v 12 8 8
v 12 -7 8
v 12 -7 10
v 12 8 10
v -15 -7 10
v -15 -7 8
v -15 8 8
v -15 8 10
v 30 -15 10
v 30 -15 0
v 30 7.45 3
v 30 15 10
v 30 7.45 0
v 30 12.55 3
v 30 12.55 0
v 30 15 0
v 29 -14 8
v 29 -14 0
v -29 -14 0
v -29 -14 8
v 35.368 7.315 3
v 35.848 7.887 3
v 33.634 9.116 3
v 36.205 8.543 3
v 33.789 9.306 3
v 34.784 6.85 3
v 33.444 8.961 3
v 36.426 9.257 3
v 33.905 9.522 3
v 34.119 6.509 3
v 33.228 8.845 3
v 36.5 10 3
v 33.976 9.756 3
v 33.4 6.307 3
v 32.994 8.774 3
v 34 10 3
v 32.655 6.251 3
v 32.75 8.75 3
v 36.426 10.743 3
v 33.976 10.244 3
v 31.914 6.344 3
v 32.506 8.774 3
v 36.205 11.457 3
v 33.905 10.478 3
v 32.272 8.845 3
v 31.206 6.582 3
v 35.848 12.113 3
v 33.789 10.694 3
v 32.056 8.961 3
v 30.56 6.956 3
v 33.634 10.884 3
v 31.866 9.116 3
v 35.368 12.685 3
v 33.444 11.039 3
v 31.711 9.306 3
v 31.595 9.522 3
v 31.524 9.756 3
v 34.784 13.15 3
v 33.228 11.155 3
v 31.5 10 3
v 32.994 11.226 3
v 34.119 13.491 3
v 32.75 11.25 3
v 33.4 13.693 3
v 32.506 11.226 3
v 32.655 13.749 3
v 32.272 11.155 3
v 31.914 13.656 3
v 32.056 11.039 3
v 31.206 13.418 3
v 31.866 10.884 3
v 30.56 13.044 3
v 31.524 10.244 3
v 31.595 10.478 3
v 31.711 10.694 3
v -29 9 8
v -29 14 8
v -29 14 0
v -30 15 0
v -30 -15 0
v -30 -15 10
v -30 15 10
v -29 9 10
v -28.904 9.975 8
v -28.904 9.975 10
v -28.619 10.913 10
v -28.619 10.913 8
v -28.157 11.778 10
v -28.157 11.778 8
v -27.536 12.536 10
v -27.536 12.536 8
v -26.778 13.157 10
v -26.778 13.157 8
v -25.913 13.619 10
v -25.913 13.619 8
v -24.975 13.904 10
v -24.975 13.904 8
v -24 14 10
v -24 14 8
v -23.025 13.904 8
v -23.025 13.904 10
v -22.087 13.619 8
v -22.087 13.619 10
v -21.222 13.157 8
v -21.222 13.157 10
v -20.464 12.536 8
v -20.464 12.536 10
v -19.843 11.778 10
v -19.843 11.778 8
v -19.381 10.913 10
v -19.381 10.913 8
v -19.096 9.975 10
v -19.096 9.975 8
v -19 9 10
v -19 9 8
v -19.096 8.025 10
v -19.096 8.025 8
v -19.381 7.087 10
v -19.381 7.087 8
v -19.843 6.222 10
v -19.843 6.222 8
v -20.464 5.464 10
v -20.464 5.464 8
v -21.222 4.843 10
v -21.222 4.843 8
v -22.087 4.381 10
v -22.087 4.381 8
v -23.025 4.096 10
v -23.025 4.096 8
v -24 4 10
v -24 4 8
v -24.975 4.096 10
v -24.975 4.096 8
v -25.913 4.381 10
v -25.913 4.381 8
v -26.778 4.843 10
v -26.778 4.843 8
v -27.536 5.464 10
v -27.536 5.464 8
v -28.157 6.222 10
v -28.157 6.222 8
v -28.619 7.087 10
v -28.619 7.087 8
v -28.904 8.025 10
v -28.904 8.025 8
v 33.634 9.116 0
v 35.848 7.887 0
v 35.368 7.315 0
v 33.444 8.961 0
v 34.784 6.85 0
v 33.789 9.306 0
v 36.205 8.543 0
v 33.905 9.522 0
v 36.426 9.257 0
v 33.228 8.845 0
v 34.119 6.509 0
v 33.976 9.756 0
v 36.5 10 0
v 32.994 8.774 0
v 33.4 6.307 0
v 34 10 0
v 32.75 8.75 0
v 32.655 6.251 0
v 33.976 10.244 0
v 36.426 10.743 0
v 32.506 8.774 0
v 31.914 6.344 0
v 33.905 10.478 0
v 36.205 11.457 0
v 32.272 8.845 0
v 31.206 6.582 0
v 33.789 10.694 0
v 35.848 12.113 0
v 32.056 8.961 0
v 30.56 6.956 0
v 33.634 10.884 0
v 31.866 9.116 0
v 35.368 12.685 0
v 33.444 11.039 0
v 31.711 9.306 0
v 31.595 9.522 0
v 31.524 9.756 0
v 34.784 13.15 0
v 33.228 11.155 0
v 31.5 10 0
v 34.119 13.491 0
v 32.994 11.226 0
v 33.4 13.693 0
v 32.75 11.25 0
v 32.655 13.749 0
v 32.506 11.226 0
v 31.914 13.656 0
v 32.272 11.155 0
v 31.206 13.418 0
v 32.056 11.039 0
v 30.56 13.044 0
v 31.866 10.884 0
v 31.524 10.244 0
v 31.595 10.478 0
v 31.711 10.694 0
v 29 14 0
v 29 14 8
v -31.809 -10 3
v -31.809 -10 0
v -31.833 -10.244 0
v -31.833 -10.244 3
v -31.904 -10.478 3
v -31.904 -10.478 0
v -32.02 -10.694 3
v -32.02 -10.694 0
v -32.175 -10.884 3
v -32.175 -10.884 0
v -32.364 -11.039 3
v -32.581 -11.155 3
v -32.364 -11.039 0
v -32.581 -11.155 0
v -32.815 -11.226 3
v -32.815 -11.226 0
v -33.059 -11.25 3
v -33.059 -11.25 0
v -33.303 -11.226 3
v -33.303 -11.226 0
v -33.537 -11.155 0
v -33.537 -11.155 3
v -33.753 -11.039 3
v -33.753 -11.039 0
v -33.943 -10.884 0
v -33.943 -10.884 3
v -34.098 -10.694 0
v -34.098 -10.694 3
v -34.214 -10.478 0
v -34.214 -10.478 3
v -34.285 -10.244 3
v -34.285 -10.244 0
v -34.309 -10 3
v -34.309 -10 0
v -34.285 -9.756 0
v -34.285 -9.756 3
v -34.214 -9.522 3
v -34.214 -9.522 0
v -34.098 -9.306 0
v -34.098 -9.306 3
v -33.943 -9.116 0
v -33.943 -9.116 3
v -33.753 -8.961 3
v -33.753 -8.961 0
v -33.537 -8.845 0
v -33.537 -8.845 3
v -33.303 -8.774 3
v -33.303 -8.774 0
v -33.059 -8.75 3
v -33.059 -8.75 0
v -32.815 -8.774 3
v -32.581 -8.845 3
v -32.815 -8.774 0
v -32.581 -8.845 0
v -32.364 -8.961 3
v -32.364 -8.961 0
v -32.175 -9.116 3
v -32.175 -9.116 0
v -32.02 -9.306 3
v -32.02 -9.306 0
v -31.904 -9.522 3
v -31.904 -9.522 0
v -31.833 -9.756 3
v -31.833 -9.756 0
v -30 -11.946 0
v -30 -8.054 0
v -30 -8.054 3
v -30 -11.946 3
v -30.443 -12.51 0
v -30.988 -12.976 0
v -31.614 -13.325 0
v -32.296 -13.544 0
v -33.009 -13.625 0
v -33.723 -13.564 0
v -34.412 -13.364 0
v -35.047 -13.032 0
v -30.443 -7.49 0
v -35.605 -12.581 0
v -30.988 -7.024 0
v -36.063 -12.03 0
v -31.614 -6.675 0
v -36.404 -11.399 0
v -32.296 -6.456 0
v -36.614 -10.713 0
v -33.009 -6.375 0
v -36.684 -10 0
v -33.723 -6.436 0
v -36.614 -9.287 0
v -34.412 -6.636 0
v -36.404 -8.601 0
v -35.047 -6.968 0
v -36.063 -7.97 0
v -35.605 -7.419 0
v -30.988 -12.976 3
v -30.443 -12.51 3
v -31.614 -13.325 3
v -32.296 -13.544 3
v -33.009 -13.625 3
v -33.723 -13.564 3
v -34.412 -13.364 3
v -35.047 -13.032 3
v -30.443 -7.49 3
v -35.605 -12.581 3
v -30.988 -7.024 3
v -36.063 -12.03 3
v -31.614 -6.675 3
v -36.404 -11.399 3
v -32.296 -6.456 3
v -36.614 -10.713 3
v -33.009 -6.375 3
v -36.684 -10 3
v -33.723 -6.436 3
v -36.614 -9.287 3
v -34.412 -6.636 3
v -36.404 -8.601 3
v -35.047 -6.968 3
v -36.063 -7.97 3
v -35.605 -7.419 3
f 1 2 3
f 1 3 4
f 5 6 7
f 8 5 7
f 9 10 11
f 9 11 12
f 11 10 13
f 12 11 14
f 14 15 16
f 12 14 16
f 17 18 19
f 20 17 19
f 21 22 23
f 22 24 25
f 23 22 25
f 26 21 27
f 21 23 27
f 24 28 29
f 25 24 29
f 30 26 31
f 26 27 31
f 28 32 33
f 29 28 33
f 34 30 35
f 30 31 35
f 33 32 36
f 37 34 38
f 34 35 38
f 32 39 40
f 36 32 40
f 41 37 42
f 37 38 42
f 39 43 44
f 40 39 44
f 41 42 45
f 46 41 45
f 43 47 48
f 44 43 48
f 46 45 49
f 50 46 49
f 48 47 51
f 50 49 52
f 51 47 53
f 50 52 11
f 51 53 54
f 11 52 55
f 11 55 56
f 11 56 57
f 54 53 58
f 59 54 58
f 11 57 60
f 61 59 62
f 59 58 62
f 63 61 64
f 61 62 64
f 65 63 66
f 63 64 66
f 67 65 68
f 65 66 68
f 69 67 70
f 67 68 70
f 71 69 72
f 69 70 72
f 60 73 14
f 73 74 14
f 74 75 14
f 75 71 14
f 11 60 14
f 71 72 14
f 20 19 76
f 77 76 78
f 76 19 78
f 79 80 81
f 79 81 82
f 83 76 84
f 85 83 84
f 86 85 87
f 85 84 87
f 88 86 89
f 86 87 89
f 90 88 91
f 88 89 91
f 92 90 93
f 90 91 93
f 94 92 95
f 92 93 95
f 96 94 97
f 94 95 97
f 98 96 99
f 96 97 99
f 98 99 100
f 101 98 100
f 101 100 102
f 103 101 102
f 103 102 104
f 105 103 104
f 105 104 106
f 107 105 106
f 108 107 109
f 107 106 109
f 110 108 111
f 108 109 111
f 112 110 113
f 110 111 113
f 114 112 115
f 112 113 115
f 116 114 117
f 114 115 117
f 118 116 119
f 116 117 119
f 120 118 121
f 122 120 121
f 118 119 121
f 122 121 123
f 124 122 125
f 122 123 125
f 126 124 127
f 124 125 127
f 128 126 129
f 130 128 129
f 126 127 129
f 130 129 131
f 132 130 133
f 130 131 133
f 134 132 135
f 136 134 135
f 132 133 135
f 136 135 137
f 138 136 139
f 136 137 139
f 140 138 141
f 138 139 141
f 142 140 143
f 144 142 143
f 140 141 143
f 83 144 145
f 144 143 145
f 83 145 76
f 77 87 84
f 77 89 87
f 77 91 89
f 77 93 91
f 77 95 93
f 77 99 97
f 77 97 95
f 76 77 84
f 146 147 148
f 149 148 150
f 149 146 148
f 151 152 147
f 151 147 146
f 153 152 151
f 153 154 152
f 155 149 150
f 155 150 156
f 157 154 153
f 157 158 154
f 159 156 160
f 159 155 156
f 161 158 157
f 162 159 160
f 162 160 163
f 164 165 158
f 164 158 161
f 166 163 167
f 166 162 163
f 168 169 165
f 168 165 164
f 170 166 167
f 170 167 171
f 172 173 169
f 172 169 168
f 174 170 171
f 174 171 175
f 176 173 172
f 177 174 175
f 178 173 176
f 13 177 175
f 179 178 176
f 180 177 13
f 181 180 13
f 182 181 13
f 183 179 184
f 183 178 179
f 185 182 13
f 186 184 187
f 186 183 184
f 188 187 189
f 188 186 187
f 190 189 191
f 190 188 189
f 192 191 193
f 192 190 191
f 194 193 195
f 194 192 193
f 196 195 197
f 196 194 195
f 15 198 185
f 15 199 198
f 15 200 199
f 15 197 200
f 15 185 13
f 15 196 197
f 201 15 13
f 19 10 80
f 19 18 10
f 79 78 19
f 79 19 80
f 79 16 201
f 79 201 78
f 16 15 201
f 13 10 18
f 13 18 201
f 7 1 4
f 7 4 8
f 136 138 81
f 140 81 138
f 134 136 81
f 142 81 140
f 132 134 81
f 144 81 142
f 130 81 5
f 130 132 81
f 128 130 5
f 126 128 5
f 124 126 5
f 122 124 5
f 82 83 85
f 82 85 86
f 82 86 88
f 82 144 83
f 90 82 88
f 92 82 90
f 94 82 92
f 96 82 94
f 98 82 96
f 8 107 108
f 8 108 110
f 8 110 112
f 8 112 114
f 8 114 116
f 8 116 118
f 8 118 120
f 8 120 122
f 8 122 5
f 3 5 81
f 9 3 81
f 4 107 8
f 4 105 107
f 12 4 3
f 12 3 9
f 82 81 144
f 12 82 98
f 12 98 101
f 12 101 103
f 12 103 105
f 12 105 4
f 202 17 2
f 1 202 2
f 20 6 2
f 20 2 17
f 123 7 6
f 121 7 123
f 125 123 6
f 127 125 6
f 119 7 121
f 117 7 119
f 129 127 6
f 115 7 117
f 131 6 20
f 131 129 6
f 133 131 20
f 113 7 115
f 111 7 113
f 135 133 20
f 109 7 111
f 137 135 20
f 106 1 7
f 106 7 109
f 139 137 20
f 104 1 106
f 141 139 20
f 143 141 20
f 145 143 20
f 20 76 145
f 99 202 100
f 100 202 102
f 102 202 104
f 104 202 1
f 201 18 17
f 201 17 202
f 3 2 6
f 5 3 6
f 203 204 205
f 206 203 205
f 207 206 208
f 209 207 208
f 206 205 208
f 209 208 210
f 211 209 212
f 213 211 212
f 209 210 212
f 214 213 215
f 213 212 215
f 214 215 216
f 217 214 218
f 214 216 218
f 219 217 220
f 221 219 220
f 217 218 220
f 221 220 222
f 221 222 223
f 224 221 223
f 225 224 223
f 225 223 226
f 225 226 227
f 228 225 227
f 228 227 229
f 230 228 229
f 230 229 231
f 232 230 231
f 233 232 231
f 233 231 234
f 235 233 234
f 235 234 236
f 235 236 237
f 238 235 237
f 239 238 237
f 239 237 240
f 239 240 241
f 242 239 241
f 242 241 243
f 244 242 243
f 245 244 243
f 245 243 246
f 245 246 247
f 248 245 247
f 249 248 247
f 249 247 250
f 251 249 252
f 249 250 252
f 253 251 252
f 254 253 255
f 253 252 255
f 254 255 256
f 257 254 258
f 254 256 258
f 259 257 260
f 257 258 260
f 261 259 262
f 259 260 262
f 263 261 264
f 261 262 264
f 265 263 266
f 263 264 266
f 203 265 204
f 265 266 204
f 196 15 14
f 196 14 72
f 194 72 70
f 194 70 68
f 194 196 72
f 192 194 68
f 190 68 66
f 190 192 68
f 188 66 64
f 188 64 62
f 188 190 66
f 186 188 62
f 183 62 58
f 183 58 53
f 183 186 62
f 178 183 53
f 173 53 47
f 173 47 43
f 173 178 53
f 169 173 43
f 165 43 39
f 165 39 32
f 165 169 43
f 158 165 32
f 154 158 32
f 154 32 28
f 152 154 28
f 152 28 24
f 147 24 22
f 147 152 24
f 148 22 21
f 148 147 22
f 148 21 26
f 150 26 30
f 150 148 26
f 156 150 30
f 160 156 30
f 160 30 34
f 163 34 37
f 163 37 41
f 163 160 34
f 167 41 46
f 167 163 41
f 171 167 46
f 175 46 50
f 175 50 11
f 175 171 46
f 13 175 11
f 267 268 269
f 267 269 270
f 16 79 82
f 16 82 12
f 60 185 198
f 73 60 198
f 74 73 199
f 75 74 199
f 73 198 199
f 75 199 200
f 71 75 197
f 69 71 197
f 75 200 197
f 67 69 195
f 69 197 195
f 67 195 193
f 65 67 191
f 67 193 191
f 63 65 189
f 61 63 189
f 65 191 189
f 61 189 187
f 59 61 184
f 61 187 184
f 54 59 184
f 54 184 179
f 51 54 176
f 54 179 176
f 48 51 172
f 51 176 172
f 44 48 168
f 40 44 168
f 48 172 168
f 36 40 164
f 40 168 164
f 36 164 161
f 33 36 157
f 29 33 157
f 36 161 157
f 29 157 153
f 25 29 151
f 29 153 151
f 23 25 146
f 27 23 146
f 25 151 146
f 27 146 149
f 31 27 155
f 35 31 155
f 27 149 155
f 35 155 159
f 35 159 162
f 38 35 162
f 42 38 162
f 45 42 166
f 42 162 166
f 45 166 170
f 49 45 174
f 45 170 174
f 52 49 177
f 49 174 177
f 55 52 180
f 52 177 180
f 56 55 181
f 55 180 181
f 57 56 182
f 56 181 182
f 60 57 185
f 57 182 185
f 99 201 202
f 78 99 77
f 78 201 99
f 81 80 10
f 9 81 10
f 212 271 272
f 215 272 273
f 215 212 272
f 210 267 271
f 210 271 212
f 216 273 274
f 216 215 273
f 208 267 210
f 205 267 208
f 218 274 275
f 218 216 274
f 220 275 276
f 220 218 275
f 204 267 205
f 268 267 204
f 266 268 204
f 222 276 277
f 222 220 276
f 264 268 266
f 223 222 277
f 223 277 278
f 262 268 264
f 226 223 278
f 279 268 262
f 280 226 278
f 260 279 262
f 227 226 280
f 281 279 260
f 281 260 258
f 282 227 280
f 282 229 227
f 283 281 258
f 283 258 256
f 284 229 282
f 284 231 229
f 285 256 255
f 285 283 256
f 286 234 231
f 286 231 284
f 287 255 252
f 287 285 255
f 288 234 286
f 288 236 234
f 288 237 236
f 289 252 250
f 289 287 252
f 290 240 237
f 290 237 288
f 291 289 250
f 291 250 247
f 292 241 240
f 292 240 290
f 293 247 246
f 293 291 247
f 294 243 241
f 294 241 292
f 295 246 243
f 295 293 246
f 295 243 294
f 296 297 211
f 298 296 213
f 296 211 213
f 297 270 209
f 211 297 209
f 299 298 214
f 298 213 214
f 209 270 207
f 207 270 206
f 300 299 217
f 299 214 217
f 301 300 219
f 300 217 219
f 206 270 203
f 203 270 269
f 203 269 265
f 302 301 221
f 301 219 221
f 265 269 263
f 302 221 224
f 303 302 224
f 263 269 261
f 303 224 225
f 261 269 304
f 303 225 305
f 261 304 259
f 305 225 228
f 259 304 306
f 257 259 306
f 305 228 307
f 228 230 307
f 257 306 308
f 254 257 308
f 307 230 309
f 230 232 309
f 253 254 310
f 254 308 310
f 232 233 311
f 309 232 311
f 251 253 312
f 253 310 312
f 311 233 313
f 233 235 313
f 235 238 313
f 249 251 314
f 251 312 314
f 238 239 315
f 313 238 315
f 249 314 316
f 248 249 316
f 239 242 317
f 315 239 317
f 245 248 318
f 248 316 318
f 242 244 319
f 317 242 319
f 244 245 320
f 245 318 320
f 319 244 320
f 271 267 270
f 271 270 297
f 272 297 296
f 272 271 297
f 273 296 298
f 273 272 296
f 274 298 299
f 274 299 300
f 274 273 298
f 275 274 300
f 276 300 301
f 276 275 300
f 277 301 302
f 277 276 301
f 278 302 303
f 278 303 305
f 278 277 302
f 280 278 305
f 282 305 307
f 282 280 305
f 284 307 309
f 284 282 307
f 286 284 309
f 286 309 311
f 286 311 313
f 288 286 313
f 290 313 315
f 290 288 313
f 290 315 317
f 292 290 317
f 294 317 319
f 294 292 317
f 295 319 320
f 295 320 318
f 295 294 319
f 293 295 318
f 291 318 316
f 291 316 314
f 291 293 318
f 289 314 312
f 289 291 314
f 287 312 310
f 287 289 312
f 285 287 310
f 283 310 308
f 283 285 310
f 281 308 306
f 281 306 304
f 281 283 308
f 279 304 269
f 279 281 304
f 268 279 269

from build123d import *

# Parameters (mm, degrees)
SKIZZE1_W                       = 60
SKIZZE1_H                       = 30
AUFSATZ_LINEAR_AUSTRAGEN1_DEPTH = 10
SKIZZE2_R                       = 5
SKIZZE2_W                       = 27
SKIZZE2_H                       = 15
SCHNITT_LINEAR_AUSTRAGEN2_DEPTH = 36
SKIZZE3_R                       = 1.25
SKIZZE3_W                       = 58
SKIZZE3_H                       = 28
SCHNITT_LINEAR_AUSTRAGEN3_DEPTH = 8
SKIZZE3_4_R                     = 1.25
SKIZZE3_4_W                     = 58
SKIZZE3_4_H                     = 28
AUFSATZ_LINEAR_AUSTRAGEN3_DEPTH = 3
SKIZZE3_5_R                     = 1.25
SKIZZE3_5_W                     = 58
SKIZZE3_5_H                     = 28
SCHNITT_LINEAR_AUSTRAGEN7_DEPTH = 3
SKIZZE3_7_R                     = 1.25
AUFSATZ_LINEAR_AUSTRAGEN4_DEPTH = 3
AUFSATZ_LINEAR_AUSTRAGEN5_DEPTH = 3
SKIZZE3_11_R                    = 1.25
SCHNITT_LINEAR_AUSTRAGEN9_DEPTH = 41.874769712


with BuildPart() as part:
    # Skizze1 → Aufsatz-Linear austragen1 (new body)
    with BuildSketch(Plane.XY):
        Rectangle(SKIZZE1_W, SKIZZE1_H)
    extrude(amount=AUFSATZ_LINEAR_AUSTRAGEN1_DEPTH)

    # Skizze2 → Schnitt-Linear austragen2 (cut, through all)
    with BuildSketch(Plane(origin=(0, 0, 0), x_dir=(-1, 0, 0), z_dir=(0, 0, -1))):
        with Locations((24, 9)):
            Circle(SKIZZE2_R)
        with Locations((1.5, 0.5)):
            Rectangle(SKIZZE2_W, SKIZZE2_H)
    extrude(amount=-SCHNITT_LINEAR_AUSTRAGEN2_DEPTH, mode=Mode.SUBTRACT)

    # Skizze3 → Schnitt-Linear austragen3 (cut)
    # profile 1 of 3: a face of its own
    with BuildSketch(Plane(origin=(0, 0, 0), x_dir=(-1, 0, 0), z_dir=(0, 0, -1))):
        with BuildLine():
            Line((-30, 12.549509757), (-30, 7.450490243))
            ThreePointArc((-30, 7.450490243), (-36.5, 10), (-30, 12.549509757))
        make_face()
        with Locations((-32.75, 10)):
            Circle(SKIZZE3_R, mode=Mode.SUBTRACT)
    # profile 2 of 3: a face of its own
    with BuildSketch(Plane(origin=(0, 0, 0), x_dir=(-1, 0, 0), z_dir=(0, 0, -1))):
        Rectangle(SKIZZE3_W, SKIZZE3_H)
    # profile 3 of 3: a face of its own
    with BuildSketch(Plane(origin=(0, 0, 0), x_dir=(-1, 0, 0), z_dir=(0, 0, -1))):
        with BuildLine():
            Line((30, -8.053874444), (30, -11.946125556))
            ThreePointArc((30, -11.946125556), (36.684421749, -10), (30, -8.053874444))
        make_face()
        with Locations((33.058910028, -10)):
            Circle(SKIZZE3_R, mode=Mode.SUBTRACT)
    extrude(amount=-SCHNITT_LINEAR_AUSTRAGEN3_DEPTH, mode=Mode.SUBTRACT)

    # Skizze3<4> → Aufsatz-Linear austragen3 (add)
    # profile 1 of 3: a face of its own
    with BuildSketch(Plane(origin=(0, 0, 0), x_dir=(-1, 0, 0), z_dir=(0, 0, -1))):
        with BuildLine():
            Line((-30, 12.549509757), (-30, 7.450490243))
            ThreePointArc((-30, 7.450490243), (-36.5, 10), (-30, 12.549509757))
        make_face()
        with Locations((-32.75, 10)):
            Circle(SKIZZE3_4_R, mode=Mode.SUBTRACT)
    # profile 2 of 3: a face of its own
    with BuildSketch(Plane(origin=(0, 0, 0), x_dir=(-1, 0, 0), z_dir=(0, 0, -1))):
        Rectangle(SKIZZE3_4_W, SKIZZE3_4_H)
    # profile 3 of 3: a face of its own
    with BuildSketch(Plane(origin=(0, 0, 0), x_dir=(-1, 0, 0), z_dir=(0, 0, -1))):
        with BuildLine():
            Line((30, -8.053874444), (30, -11.946125556))
            ThreePointArc((30, -11.946125556), (36.684421749, -10), (30, -8.053874444))
        make_face()
        with Locations((33.058910028, -10)):
            Circle(SKIZZE3_4_R, mode=Mode.SUBTRACT)
    extrude(amount=-AUFSATZ_LINEAR_AUSTRAGEN3_DEPTH)

    # Skizze3<5> → Schnitt-Linear austragen7 (cut)
    # profile 1 of 3: a face of its own
    with BuildSketch(Plane(origin=(0, 0, 0), x_dir=(-1, 0, 0), z_dir=(0, 0, -1))):
        with BuildLine():
            Line((-30, 12.549509757), (-30, 7.450490243))
            ThreePointArc((-30, 7.450490243), (-36.5, 10), (-30, 12.549509757))
        make_face()
        with Locations((-32.75, 10)):
            Circle(SKIZZE3_5_R, mode=Mode.SUBTRACT)
    # profile 2 of 3: a face of its own
    with BuildSketch(Plane(origin=(0, 0, 0), x_dir=(-1, 0, 0), z_dir=(0, 0, -1))):
        Rectangle(SKIZZE3_5_W, SKIZZE3_5_H)
    # profile 3 of 3: a face of its own
    with BuildSketch(Plane(origin=(0, 0, 0), x_dir=(-1, 0, 0), z_dir=(0, 0, -1))):
        with BuildLine():
            Line((30, -8.053874444), (30, -11.946125556))
            ThreePointArc((30, -11.946125556), (36.684421749, -10), (30, -8.053874444))
        make_face()
        with Locations((33.058910028, -10)):
            Circle(SKIZZE3_5_R, mode=Mode.SUBTRACT)
    extrude(amount=-SCHNITT_LINEAR_AUSTRAGEN7_DEPTH, mode=Mode.SUBTRACT)

    # Skizze3<7> → Aufsatz-Linear austragen4 (add)
    with BuildSketch(Plane(origin=(0, 0, 0), x_dir=(-1, 0, 0), z_dir=(0, 0, -1))):
        with BuildLine():
            Line((-30, 7.450490243), (-30, 12.549509757))
            ThreePointArc((-30, 12.549509757), (-36.5, 10), (-30, 7.450490243))
        make_face()
        with Locations((-32.75, 10)):
            Circle(SKIZZE3_7_R, mode=Mode.SUBTRACT)
    extrude(amount=-AUFSATZ_LINEAR_AUSTRAGEN4_DEPTH)


with BuildPart() as body_2:
    # Skizze3<9> → Aufsatz-Linear austragen5 (new body)
    with BuildSketch(Plane(origin=(0, 0, 0), x_dir=(-1, 0, 0), z_dir=(0, 0, -1))):
        with BuildLine():
            Line((30, -8.053874444), (30, -11.946125556))
            ThreePointArc((30, -11.946125556), (36.684421749, -10), (30, -8.053874444))
        make_face()
    extrude(amount=-AUFSATZ_LINEAR_AUSTRAGEN5_DEPTH)

    # Skizze3<11> → Schnitt-Linear austragen9 (cut, through all)
    with BuildSketch(Plane(origin=(0, 0, 0), x_dir=(-1, 0, 0), z_dir=(0, 0, -1))):
        with Locations((33.058910028, -10)):
            Circle(SKIZZE3_11_R)
    extrude(amount=-SCHNITT_LINEAR_AUSTRAGEN9_DEPTH, mode=Mode.SUBTRACT)


solid = Compound([part.part, body_2.part])
